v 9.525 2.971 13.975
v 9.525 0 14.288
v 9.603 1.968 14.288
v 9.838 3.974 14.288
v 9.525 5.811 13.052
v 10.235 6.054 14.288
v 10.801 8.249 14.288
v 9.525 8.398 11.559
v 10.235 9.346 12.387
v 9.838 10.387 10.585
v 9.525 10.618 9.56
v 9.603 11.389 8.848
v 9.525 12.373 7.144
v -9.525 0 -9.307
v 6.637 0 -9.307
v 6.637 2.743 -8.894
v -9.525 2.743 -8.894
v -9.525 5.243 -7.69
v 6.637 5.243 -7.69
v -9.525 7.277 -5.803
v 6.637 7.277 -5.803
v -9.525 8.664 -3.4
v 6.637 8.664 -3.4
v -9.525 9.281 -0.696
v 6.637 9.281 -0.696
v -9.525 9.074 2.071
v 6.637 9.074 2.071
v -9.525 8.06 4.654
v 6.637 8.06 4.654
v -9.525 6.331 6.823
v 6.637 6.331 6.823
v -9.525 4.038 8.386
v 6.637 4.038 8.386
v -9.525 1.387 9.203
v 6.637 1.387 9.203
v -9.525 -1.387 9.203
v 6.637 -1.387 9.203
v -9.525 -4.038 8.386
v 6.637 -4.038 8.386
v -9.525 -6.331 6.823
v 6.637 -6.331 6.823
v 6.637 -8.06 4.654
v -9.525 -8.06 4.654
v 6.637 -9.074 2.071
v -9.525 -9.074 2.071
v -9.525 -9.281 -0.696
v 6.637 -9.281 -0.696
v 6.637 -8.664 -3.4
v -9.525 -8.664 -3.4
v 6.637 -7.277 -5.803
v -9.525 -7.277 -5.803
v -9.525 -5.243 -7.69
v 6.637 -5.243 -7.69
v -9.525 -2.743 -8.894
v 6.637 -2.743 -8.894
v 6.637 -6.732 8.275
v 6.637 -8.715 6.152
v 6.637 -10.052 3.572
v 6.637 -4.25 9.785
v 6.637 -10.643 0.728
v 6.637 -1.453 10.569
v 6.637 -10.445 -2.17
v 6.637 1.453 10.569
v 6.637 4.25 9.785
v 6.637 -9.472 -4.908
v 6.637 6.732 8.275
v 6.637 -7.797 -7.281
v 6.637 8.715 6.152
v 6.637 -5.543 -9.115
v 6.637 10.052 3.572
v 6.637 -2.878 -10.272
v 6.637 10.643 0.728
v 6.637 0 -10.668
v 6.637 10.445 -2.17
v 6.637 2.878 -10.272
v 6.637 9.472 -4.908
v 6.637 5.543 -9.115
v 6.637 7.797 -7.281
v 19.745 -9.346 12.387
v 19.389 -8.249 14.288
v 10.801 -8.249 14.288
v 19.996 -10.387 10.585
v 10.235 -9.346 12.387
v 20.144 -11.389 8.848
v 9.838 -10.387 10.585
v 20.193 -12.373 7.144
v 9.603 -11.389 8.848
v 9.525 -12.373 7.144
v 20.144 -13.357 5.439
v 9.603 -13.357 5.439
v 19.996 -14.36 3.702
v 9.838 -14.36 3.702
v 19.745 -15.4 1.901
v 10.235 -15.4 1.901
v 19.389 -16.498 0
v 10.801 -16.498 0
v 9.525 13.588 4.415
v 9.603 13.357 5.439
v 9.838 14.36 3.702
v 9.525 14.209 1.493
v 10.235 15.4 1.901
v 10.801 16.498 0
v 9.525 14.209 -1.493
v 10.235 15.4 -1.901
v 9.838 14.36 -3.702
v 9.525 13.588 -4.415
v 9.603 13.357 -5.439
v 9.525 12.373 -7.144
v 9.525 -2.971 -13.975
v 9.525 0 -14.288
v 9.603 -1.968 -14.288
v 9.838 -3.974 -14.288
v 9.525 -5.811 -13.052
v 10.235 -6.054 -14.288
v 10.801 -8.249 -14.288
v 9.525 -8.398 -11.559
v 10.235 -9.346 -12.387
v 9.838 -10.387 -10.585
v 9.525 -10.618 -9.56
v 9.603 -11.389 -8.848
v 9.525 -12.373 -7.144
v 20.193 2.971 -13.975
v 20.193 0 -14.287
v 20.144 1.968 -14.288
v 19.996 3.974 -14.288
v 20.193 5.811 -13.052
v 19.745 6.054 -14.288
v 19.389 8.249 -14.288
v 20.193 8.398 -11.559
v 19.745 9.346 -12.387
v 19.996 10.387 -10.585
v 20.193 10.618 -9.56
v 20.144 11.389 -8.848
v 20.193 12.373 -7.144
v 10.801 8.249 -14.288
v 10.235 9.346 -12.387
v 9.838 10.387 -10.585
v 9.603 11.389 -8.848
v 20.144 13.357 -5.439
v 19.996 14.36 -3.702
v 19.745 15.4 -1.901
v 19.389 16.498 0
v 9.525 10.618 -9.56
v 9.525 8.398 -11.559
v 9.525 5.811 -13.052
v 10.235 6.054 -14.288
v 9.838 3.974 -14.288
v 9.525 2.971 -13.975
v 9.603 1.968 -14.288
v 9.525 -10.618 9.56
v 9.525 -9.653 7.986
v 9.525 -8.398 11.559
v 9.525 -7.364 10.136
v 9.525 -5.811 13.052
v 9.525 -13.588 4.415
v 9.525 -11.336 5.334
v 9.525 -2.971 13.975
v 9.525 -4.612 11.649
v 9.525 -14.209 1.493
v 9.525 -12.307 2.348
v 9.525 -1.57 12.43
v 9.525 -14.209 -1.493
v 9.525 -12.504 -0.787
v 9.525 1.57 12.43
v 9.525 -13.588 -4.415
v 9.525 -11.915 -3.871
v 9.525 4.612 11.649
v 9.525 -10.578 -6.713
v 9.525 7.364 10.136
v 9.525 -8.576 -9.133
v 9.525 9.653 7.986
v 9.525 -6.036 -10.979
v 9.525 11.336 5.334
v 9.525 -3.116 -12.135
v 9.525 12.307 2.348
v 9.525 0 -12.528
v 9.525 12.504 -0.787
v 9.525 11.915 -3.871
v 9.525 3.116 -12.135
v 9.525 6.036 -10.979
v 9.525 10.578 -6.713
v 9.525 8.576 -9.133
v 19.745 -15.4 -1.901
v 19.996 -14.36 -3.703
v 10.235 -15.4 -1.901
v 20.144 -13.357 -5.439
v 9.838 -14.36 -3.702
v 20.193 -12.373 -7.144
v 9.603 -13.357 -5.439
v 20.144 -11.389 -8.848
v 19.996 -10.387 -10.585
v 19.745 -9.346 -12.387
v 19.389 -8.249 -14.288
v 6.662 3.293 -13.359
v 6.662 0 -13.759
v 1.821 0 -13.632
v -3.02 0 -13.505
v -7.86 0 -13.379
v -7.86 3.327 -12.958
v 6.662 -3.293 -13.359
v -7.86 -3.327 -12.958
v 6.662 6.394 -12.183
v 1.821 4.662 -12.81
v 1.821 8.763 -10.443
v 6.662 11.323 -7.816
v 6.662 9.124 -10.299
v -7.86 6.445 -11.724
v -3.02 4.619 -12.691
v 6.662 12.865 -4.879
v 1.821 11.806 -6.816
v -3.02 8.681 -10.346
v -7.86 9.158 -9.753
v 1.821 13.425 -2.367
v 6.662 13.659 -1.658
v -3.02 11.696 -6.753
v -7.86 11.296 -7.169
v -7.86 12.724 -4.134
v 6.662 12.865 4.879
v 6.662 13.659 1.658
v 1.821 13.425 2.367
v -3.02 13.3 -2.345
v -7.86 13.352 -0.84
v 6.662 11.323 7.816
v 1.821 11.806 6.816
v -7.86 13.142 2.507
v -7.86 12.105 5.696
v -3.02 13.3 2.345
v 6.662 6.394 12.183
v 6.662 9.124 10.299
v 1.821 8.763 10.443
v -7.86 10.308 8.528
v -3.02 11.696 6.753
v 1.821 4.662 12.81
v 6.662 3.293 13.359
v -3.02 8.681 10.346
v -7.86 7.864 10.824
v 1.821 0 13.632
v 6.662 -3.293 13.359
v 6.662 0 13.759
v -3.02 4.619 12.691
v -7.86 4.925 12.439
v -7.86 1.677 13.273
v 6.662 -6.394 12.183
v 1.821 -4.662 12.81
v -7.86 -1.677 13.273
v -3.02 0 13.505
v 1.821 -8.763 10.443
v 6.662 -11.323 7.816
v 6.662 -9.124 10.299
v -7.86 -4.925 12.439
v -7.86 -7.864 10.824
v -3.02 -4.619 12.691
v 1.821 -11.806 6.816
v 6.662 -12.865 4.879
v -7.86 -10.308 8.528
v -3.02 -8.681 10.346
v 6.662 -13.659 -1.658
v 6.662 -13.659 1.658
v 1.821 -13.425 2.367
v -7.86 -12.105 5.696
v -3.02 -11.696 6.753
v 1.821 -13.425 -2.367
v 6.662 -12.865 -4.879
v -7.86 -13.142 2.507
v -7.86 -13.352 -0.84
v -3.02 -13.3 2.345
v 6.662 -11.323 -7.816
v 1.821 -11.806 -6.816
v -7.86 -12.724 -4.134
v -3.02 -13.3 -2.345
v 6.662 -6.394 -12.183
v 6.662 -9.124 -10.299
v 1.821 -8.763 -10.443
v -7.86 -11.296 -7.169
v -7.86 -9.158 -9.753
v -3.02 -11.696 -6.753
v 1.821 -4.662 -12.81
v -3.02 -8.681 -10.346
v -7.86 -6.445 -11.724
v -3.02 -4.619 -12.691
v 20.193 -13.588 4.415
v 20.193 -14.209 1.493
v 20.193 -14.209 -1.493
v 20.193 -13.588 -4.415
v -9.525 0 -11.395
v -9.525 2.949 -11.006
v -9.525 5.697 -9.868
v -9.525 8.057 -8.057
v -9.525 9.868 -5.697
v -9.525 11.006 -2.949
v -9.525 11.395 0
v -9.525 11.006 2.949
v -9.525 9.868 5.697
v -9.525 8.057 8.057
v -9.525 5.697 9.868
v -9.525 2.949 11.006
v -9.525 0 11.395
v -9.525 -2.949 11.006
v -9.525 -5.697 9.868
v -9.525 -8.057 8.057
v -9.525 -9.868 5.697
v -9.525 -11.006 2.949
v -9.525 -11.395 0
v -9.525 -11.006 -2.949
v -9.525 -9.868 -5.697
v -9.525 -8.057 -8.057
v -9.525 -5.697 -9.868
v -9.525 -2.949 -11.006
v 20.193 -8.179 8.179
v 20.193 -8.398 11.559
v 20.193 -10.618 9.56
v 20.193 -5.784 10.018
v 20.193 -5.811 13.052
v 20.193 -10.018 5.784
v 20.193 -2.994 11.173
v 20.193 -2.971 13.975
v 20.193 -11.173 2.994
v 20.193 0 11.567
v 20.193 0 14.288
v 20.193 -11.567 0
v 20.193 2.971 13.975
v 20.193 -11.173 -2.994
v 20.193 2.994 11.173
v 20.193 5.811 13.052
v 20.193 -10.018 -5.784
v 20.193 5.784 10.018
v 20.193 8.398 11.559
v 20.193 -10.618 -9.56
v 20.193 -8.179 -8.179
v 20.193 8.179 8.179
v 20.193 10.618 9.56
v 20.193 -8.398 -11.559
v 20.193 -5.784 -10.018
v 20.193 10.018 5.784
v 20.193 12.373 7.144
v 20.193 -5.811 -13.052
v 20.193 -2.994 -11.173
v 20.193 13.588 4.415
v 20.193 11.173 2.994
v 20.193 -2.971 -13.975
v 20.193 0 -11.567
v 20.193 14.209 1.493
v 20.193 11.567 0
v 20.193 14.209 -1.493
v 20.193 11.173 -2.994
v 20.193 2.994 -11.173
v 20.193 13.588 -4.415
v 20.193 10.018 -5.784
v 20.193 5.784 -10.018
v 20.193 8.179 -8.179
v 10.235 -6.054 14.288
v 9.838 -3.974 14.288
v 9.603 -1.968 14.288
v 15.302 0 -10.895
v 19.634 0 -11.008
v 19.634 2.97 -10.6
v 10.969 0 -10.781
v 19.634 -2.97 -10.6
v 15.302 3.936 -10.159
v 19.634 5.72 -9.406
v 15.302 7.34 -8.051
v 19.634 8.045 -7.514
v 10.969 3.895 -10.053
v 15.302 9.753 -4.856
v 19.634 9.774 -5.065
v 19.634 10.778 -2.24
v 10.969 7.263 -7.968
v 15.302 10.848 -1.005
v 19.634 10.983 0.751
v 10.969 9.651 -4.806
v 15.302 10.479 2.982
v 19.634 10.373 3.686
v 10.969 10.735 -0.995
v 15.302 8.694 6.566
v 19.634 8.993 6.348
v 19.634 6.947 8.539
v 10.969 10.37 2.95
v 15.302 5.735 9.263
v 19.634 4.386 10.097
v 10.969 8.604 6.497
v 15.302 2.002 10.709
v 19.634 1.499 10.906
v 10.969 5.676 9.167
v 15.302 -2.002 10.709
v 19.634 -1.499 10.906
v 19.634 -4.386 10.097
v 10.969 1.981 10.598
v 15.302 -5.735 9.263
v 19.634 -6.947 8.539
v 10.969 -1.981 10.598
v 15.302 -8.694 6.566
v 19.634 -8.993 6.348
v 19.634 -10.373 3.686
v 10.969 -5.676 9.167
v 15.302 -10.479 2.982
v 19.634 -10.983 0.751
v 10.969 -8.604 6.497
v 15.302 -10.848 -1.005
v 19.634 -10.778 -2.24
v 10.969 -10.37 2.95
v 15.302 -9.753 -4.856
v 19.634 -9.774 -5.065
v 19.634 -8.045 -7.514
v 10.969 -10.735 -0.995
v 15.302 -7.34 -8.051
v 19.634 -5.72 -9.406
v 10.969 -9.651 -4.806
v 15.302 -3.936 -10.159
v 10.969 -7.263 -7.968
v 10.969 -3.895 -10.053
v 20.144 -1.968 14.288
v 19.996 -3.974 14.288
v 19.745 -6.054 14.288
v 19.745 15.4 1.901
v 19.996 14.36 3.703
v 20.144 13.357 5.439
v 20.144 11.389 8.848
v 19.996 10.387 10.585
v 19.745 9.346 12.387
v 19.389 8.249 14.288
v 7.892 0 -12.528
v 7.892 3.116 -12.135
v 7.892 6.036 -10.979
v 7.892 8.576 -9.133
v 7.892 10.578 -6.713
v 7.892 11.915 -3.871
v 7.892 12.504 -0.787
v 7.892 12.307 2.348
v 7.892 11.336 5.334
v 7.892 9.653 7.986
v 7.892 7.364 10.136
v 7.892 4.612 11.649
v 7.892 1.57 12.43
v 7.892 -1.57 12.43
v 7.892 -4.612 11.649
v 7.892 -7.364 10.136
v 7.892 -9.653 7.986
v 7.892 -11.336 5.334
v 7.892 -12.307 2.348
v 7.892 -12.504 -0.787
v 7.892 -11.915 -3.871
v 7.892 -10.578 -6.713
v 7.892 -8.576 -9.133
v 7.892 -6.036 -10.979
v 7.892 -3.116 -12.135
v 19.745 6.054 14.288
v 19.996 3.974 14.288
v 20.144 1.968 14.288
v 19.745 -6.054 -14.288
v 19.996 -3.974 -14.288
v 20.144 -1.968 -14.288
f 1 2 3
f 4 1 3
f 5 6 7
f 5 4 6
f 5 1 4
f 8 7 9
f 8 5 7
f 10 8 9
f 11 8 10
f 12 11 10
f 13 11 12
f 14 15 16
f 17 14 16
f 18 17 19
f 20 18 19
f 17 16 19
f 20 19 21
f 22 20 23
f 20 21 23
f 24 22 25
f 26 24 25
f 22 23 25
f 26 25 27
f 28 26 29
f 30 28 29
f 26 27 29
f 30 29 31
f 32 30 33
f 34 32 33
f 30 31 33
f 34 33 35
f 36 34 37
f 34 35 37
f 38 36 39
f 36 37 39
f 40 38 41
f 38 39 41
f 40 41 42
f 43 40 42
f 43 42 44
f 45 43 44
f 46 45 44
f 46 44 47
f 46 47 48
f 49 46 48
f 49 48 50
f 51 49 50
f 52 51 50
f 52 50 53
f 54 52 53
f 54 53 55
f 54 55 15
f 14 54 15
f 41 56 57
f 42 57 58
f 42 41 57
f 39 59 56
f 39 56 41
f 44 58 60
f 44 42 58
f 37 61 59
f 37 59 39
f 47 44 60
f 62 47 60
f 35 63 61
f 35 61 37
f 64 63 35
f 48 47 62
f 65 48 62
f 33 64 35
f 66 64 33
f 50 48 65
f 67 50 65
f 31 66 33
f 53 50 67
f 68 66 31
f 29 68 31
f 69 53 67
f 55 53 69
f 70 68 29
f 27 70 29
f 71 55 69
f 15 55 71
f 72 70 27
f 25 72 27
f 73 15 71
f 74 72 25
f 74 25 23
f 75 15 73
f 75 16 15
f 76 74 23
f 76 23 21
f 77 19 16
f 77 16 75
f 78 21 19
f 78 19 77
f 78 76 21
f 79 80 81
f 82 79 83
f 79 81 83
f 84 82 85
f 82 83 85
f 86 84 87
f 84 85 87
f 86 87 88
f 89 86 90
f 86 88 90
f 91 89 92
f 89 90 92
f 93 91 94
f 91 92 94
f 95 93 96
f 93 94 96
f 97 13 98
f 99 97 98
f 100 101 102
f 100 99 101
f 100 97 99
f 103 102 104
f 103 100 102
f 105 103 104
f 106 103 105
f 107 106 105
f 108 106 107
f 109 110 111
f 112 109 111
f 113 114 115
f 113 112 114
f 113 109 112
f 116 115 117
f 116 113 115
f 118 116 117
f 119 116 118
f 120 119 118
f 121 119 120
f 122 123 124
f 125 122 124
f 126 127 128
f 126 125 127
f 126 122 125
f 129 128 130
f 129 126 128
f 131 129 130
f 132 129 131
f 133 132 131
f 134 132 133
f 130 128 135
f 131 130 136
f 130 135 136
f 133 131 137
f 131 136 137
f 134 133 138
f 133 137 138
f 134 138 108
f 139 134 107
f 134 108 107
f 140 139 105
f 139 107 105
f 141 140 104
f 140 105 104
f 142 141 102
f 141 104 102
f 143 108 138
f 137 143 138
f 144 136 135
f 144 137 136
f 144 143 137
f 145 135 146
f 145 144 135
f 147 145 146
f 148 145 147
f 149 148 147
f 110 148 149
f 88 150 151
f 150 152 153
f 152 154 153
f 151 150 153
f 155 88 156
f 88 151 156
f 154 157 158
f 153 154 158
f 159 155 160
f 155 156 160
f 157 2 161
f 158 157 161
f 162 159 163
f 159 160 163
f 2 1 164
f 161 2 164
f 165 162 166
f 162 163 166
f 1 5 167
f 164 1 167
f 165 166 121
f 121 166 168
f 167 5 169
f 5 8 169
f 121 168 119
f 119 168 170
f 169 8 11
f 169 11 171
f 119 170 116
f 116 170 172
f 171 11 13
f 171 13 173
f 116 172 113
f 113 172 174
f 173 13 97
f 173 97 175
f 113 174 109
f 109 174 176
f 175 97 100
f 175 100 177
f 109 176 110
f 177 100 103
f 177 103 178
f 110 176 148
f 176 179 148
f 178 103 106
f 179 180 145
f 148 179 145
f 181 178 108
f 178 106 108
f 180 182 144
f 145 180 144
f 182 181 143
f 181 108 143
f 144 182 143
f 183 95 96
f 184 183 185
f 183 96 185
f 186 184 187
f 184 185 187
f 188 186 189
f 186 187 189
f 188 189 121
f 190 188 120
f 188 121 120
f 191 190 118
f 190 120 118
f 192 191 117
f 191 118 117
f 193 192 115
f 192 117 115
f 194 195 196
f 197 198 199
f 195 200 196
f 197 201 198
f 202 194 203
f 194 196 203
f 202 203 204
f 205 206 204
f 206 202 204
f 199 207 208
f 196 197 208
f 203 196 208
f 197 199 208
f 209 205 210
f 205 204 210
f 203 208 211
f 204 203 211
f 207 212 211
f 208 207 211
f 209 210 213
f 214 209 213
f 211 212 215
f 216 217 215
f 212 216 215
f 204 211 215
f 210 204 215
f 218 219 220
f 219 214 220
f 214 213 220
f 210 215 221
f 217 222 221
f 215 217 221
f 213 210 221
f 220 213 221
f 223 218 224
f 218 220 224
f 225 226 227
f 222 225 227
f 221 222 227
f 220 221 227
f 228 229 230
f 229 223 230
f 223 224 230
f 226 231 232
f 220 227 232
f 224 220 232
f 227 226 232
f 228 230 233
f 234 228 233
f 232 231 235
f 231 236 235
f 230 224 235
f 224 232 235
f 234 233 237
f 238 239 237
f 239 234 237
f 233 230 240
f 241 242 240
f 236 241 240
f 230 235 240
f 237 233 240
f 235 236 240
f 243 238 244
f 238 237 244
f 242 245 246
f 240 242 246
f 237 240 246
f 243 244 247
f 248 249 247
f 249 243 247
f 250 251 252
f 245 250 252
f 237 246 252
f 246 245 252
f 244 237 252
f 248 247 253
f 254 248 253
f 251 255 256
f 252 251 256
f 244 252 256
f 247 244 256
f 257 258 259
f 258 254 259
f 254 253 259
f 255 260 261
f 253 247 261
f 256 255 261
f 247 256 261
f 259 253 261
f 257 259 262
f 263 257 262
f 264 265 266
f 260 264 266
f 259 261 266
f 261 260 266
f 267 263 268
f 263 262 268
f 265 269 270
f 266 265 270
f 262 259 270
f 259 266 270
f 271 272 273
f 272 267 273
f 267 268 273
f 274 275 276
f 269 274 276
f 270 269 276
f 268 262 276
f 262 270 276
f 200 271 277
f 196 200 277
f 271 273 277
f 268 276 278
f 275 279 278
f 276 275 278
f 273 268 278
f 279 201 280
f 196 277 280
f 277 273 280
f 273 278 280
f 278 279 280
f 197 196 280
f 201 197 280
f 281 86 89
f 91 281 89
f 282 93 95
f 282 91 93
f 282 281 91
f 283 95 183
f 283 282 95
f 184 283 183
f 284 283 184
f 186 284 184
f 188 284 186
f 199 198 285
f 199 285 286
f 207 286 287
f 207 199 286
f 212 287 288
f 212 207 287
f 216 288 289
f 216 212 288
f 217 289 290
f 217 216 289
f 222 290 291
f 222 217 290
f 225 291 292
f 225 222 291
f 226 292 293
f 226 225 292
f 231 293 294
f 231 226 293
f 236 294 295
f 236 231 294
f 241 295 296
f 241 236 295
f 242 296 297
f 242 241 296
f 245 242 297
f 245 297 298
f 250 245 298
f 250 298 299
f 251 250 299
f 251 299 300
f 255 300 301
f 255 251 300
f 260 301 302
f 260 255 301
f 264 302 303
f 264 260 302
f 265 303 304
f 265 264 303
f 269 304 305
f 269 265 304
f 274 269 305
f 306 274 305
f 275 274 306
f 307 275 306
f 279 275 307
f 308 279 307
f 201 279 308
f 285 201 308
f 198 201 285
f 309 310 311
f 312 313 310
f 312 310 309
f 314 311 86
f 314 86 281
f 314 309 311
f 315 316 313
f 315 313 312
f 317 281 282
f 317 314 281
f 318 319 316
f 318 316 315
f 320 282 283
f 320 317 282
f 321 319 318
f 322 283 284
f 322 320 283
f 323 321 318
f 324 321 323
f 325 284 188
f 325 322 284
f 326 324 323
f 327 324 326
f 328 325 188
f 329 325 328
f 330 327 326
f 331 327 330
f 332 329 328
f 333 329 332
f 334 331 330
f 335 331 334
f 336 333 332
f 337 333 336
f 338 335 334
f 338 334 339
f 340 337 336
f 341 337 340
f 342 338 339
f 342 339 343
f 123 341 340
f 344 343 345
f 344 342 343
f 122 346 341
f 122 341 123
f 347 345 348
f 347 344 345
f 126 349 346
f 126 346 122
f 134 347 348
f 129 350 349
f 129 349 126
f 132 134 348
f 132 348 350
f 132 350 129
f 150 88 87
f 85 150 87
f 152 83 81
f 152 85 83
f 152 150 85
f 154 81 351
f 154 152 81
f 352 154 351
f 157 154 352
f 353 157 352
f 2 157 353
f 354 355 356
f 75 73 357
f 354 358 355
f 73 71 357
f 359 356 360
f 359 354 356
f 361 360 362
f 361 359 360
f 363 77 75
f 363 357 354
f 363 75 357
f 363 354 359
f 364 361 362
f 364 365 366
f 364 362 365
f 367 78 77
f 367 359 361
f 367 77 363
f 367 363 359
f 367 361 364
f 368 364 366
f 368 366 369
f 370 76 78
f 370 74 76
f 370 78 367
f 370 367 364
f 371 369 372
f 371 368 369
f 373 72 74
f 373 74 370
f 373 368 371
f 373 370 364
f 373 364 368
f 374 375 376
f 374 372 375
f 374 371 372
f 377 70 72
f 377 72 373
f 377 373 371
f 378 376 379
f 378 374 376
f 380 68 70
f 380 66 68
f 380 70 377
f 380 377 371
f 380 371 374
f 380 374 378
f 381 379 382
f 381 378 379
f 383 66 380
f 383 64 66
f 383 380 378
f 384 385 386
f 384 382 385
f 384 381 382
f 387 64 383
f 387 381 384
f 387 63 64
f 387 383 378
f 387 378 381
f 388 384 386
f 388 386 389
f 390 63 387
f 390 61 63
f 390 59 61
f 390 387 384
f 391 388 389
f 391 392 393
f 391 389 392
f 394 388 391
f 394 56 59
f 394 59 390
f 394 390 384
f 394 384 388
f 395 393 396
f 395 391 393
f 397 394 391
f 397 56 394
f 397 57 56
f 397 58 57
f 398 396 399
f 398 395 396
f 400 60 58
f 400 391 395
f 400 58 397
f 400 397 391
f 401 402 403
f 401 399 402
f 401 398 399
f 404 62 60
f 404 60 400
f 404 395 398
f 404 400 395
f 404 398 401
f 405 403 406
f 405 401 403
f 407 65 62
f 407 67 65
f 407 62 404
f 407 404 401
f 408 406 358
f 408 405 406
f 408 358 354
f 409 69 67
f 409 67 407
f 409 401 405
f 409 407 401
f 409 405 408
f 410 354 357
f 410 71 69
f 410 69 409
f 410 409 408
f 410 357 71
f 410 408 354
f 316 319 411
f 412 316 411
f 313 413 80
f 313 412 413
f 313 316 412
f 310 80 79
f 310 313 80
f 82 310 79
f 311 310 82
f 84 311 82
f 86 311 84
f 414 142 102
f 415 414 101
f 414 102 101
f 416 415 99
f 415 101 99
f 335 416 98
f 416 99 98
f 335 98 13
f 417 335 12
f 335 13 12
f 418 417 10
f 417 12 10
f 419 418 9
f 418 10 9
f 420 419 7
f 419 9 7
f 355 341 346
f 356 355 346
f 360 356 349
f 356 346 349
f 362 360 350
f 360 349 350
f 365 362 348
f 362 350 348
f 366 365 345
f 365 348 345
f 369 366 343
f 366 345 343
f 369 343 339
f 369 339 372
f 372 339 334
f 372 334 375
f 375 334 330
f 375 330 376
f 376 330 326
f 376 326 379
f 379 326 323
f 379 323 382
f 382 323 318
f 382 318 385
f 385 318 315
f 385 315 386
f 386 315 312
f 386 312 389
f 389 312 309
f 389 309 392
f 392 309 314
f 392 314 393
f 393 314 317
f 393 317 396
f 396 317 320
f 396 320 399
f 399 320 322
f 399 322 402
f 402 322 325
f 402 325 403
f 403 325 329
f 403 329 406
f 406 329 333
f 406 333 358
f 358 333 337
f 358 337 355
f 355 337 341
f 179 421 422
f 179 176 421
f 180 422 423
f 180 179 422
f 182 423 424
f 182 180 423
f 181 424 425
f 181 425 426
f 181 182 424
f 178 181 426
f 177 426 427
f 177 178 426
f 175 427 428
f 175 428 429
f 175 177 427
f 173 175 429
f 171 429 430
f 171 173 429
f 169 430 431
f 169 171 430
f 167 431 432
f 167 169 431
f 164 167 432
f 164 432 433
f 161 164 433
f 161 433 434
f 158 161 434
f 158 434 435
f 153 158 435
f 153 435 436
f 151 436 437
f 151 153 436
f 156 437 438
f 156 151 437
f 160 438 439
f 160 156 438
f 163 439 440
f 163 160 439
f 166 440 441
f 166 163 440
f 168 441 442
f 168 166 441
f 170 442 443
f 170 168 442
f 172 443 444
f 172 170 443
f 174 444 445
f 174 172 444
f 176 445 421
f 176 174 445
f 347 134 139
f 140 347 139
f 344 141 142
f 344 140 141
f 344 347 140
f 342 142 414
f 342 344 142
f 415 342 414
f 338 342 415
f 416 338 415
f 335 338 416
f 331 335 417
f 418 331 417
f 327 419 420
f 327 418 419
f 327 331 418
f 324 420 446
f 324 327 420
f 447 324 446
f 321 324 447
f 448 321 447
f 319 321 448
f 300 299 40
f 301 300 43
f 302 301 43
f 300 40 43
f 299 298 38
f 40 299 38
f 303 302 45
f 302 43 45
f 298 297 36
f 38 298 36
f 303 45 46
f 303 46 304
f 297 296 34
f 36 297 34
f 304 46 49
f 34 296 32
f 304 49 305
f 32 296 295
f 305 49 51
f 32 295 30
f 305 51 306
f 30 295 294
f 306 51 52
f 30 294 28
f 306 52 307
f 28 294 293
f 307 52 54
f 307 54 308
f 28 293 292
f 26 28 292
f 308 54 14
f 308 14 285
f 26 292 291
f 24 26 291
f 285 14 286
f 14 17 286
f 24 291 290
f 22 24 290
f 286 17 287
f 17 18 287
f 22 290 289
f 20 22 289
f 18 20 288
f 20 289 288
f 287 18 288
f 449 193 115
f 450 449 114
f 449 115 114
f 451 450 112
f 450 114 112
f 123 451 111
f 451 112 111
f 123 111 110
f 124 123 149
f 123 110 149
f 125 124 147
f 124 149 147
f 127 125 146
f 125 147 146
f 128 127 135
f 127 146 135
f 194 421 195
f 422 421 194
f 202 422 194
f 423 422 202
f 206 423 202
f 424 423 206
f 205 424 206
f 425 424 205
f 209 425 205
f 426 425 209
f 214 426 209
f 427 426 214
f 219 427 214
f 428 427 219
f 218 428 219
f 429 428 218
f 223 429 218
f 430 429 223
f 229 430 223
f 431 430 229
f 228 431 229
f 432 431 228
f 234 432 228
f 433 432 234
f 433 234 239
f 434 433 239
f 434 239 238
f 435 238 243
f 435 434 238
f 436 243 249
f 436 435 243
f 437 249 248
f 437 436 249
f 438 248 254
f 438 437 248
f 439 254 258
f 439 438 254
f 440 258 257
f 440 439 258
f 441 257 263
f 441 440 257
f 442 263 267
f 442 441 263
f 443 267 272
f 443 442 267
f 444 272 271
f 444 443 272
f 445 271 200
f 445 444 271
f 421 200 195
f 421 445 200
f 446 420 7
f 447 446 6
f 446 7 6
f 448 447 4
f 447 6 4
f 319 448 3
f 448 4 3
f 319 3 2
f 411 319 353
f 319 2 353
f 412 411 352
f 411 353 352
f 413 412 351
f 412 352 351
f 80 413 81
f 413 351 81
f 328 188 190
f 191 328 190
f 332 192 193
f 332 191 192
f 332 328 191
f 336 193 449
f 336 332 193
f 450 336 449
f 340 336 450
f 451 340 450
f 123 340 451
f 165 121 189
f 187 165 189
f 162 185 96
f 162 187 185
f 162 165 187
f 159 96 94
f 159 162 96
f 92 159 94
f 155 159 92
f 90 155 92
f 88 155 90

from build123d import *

# Parameters (mm, degrees)
SKETCH2_R          = 13.335
EXTRUDE1_DEPTH     = 19.05
EXTRUDE1_DRAFT     = -1.5
EXTRUDE2_DEPTH     = 10.668
SKETCH4_OUTSIDE_W  = 249.236
SKETCH4_OUTSIDE_H  = 253.656
SKETCH4_OUTSIDE_R  = 14.2875
CUT_EXTRUDE1_DEPTH = 37.870978496
CUT_EXTRUDE1_DRAFT = -70
SKETCH23_OUTSIDE_W = 144.954
SKETCH23_OUTSIDE_H = 149.374
SKETCH23_OUTSIDE_R = 14.2875
CUT_EXTRUDE7_DEPTH = 29.969156551
CUT_EXTRUDE7_DRAFT = -60
SKETCH15_R         = 10.668
CUT_EXTRUDE2_DEPTH = 28.15732722
CUT_EXTRUDE2_DRAFT = -1.5
SKETCH17_R         = 9.307285714
CUT_EXTRUDE3_DEPTH = 28.15732722
SKETCH18_R         = 11.567261543
CUT_EXTRUDE6_DEPTH = 6.35
CUT_EXTRUDE6_DRAFT = -45


with BuildPart() as part:
    # Sketch2 → Extrude1 (with draft: the straight prism first)
    with BuildSketch(Plane(origin=(-9.525, 0, 0), x_dir=(0, 0, -1), z_dir=(1, 0, 0))):
        Circle(SKETCH2_R)
    extrude(amount=EXTRUDE1_DEPTH)
    # Extrude1: the draft: its side faces are tilted about the plane it starts from
    extrude1_sides = [part.faces().sort_by_distance(p)[0] for p in [
        (0, 0, 13.335),
    ]]
    draft(extrude1_sides, Plane(origin=(-9.525, 0, 0), x_dir=(0, 0, -1), z_dir=(1, 0, 0)), EXTRUDE1_DRAFT)

    # Sketch8 → Cut-Revolve1 (revolve, cut)
    with BuildSketch(Plane.XY, mode=Mode.PRIVATE) as cut_revolve1_sk:
        Polygon((-9.525, 14.281645334), (-9.525, 11.394586861), (-7.1024703, 14.281645334), align=None)
        Polygon((9.525, 12.528428667), (9.525, 14.281645334), (6.13892619, 14.281645334), (7.892142857, 12.528428667), align=None)
    revolve(cut_revolve1_sk.sketch.rotate(Axis((-9.525, 0, 0), (1, 0, 0)), 270), axis=Axis((-9.525, 0, 0), (1, 0, 0)), mode=Mode.SUBTRACT)

    # Sketch3 → Extrude2 (add)
    with BuildSketch(Plane(origin=(9.525, 0, 0), x_dir=(0, 0, -1), z_dir=(1, 0, 0))):
        Polygon((14.2875, 8.248891971), (0, 16.497783942), (-14.2875, 8.248891971), (-14.2875, -8.248891971), (0, -16.497783942), (14.2875, -8.248891971), align=None)
    extrude(amount=EXTRUDE2_DEPTH)


with BuildPart() as cut_extrude1_tool:
    # Sketch4 outside → Cut-Extrude1 (with draft: the straight prism first)
    with BuildSketch(Plane(origin=(20.193, 0, 0), x_dir=(0, 0, -1), z_dir=(1, 0, 0))):
        Rectangle(SKETCH4_OUTSIDE_W, SKETCH4_OUTSIDE_H)
        Circle(SKETCH4_OUTSIDE_R, mode=Mode.SUBTRACT)
    extrude(amount=-CUT_EXTRUDE1_DEPTH)
    # Cut-Extrude1: the draft: its side faces are tilted about the plane it starts from
    cut_extrude1_sides = [cut_extrude1_tool.faces().sort_by_distance(p)[0] for p in [
        (1.257510752, -126.828, 0),
        (1.257510752, 0, -124.618),
        (1.257510752, 126.828, 0),
        (1.257510752, 0, 124.618),
        (1.257510752, 0, 14.2875),
    ]]
    draft(cut_extrude1_sides, Plane(origin=(20.193, 0, 0), x_dir=(0, 0, -1), z_dir=(1, 0, 0)), CUT_EXTRUDE1_DRAFT)


with BuildPart() as part_1:
    add(part.part)

    # Cut-Extrude1: cut by cut_extrude1_tool
    add(cut_extrude1_tool.part, mode=Mode.SUBTRACT)


with BuildPart() as cut_extrude7_tool:
    # Sketch23 outside → Cut-Extrude7 (with draft: the straight prism first)
    with BuildSketch(Plane.ZY.offset(-9.525)):
        Rectangle(SKETCH23_OUTSIDE_W, SKETCH23_OUTSIDE_H)
        Circle(SKETCH23_OUTSIDE_R, mode=Mode.SUBTRACT)
    extrude(amount=-CUT_EXTRUDE7_DEPTH)
    # Cut-Extrude7: the draft: its side faces are tilted about the plane it starts from
    cut_extrude7_sides = [cut_extrude7_tool.faces().sort_by_distance(p)[0] for p in [
        (24.509578275, -74.687, 0),
        (24.509578275, 0, 72.477),
        (24.509578275, 74.687, 0),
        (24.509578275, 0, -72.477),
        (24.509578275, 0, -14.2875),
    ]]
    draft(cut_extrude7_sides, Plane.ZY.offset(-9.525), CUT_EXTRUDE7_DRAFT)


with BuildPart() as part_2:
    add(part_1.part)

    # Cut-Extrude7: cut by cut_extrude7_tool
    add(cut_extrude7_tool.part, mode=Mode.SUBTRACT)


with BuildPart() as cut_extrude2_tool:
    # Sketch15 → Cut-Extrude2 (with draft: the straight prism first)
    with BuildSketch(Plane(origin=(6.63702, 0, 0), x_dir=(0, 0, -1), z_dir=(1, 0, 0))):
        Circle(SKETCH15_R)
    extrude(amount=CUT_EXTRUDE2_DEPTH)
    # Cut-Extrude2: the draft: its side faces are tilted about the plane it starts from
    cut_extrude2_sides = [cut_extrude2_tool.faces().sort_by_distance(p)[0] for p in [
        (20.71568361, 0, 10.668),
    ]]
    draft(cut_extrude2_sides, Plane(origin=(6.63702, 0, 0), x_dir=(0, 0, -1), z_dir=(1, 0, 0)), CUT_EXTRUDE2_DRAFT)


with BuildPart() as part_3:
    add(part_2.part)

    # Cut-Extrude2: cut by cut_extrude2_tool
    add(cut_extrude2_tool.part, mode=Mode.SUBTRACT)

    # Sketch17 → Cut-Extrude3 (cut, through all)
    with BuildSketch(Plane(origin=(6.63702, 0, 0), x_dir=(0, 0, -1), z_dir=(1, 0, 0))):
        Circle(SKETCH17_R)
    extrude(amount=-CUT_EXTRUDE3_DEPTH, mode=Mode.SUBTRACT)


with BuildPart() as cut_extrude6_tool:
    # Sketch18 → Cut-Extrude6 (with draft: the straight prism first)
    with BuildSketch(Plane(origin=(20.193, 0, 0), x_dir=(0, 0, -1), z_dir=(1, 0, 0))):
        Circle(SKETCH18_R)
    extrude(amount=-CUT_EXTRUDE6_DEPTH)
    # Cut-Extrude6: the draft: its side faces are tilted about the plane it starts from
    cut_extrude6_sides = [cut_extrude6_tool.faces().sort_by_distance(p)[0] for p in [
        (17.018, 0, 11.567261543),
    ]]
    draft(cut_extrude6_sides, Plane(origin=(20.193, 0, 0), x_dir=(0, 0, -1), z_dir=(1, 0, 0)), CUT_EXTRUDE6_DRAFT)


with BuildPart() as part_4:
    add(part_3.part)

    # Cut-Extrude6: cut by cut_extrude6_tool
    add(cut_extrude6_tool.part, mode=Mode.SUBTRACT)


solid = part_4.part
